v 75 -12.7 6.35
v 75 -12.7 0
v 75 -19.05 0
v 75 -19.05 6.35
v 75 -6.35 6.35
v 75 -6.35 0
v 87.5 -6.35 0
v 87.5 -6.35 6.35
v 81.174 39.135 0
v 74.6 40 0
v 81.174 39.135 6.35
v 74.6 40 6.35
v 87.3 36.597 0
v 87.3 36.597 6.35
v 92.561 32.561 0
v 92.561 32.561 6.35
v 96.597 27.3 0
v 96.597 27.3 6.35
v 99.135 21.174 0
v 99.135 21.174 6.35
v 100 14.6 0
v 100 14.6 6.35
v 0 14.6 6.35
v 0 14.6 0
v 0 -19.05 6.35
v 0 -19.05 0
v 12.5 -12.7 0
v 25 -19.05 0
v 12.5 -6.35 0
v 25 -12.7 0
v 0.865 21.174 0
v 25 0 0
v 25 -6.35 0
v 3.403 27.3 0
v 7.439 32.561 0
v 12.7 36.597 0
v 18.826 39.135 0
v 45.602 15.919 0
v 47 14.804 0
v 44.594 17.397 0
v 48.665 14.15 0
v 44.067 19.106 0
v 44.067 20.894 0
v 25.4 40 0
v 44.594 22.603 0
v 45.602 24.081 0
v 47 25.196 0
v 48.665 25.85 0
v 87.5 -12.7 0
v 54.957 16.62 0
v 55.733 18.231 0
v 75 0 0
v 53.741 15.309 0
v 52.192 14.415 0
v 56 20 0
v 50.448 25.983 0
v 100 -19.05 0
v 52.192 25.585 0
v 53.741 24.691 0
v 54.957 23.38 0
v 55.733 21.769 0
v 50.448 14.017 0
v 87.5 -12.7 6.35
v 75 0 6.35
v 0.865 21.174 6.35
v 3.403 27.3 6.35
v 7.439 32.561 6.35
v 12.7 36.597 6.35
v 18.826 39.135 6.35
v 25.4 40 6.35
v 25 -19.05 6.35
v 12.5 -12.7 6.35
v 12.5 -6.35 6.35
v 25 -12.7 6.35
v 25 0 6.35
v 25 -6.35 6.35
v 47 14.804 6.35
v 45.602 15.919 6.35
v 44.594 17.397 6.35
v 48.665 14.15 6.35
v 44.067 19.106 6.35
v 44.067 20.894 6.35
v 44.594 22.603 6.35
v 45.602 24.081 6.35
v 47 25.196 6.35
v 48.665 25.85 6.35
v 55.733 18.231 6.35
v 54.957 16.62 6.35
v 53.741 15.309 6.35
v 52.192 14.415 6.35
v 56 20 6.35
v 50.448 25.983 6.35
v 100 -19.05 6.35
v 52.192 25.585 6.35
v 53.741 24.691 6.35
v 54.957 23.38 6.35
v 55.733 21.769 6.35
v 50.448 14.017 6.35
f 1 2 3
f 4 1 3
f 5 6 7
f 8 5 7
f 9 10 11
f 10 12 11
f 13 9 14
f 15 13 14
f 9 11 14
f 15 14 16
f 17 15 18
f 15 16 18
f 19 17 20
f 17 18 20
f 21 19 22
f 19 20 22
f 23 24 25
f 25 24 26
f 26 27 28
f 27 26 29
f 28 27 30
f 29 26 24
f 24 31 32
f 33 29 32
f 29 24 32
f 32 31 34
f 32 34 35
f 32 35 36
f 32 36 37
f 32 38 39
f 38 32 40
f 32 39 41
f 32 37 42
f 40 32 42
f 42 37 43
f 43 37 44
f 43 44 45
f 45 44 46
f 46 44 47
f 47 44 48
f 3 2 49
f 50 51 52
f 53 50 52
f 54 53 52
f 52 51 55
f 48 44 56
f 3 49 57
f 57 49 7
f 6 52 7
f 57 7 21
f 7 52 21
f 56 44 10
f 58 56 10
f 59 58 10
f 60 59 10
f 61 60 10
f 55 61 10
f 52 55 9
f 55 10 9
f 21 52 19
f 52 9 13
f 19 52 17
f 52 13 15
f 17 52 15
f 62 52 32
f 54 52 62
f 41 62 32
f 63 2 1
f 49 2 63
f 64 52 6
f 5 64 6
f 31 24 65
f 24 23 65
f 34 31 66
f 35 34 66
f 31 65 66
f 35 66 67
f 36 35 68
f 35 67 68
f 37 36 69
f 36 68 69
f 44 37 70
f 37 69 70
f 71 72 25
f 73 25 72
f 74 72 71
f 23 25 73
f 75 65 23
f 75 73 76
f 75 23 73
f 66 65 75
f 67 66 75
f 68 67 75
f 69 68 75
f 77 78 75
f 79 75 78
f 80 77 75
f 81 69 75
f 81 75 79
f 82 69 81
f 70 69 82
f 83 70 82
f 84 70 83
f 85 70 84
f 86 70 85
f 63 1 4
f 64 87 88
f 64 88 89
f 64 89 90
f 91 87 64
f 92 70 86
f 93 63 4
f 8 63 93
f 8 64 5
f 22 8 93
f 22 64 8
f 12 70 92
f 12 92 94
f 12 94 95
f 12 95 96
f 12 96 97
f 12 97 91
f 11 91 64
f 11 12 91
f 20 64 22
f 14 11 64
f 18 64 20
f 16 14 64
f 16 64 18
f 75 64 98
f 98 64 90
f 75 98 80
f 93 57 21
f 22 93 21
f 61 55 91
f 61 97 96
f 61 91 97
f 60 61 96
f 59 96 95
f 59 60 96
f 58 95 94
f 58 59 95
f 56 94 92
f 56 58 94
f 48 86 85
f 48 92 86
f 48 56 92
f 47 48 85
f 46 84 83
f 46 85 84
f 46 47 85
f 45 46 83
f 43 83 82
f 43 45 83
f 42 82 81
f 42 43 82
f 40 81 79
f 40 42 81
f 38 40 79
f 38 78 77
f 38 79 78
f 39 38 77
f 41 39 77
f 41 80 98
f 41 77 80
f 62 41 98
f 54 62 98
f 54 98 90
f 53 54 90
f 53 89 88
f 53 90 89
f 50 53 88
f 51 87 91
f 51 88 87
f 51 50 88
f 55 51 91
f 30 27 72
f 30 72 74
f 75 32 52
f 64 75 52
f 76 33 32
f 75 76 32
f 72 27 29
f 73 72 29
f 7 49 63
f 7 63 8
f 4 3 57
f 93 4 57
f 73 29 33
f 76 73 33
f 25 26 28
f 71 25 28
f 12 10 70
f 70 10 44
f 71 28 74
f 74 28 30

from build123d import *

# Parameters (mm, degrees)
BOSS_EXTRUDE1_DEPTH     = 6.35
CUT_EXTRUDE1_DEPTH      = 108.890326167
CUT_EXTRUDE1_DEPTH_BACK = 108.890326167
SKETCH2_R               = 5.999999938
FILLET1_R               = 25.4
CUT_EXTRUDE2_DEPTH      = 108.890326167
CUT_EXTRUDE2_DEPTH_BACK = 108.890326167
SKETCH3_W               = 12.499999987
SKETCH3_H               = 6.35


with BuildPart() as part:
    # Sketch1 → Boss-Extrude1 (new body)
    with BuildSketch(Plane.XY):
        Polygon((24.999999974, 0), (74.999999924, 0), (74.999999923, -6.35), (74.999999923, -19.05), (99.999999898, -19.05), (99.999999898, -6.35), (99.999999898, 0), (99.999999898, 40.00000001), (0, 40.00000001), (0, 0), (0, -6.35), (0, -19.05), (24.999999974, -19.05), (24.999999974, -6.35), align=None)
    extrude(amount=BOSS_EXTRUDE1_DEPTH)

    # Sketch2 → Cut-Extrude1 (cut, two sides: drawn at the far end of the back side and taken through both)
    with BuildSketch(Plane.XY.offset(6.35).offset(-CUT_EXTRUDE1_DEPTH_BACK)):
        with Locations((49.999999949, 20.000000005)):
            Circle(SKETCH2_R)
    extrude(amount=CUT_EXTRUDE1_DEPTH + CUT_EXTRUDE1_DEPTH_BACK, mode=Mode.SUBTRACT)

    # Fillet1
    fillet1_edges = [part.edges().sort_by_distance(p)[0] for p in [
        (0, 40.00000001, 3.175),
        (99.999999898, 40.00000001, 3.175),
    ]]
    fillet(fillet1_edges, radius=FILLET1_R)

    # Sketch3 → Cut-Extrude2 (cut, two sides: drawn at the far end of the back side and taken through both)
    with BuildSketch(Plane.XY.offset(6.35).offset(-CUT_EXTRUDE2_DEPTH_BACK)):
        with Locations((81.249999918, -9.525)):
            Rectangle(SKETCH3_W, SKETCH3_H)
        with Locations((18.749999981, -9.525)):
            Rectangle(SKETCH3_W, SKETCH3_H)
    extrude(amount=CUT_EXTRUDE2_DEPTH + CUT_EXTRUDE2_DEPTH_BACK, mode=Mode.SUBTRACT)


solid = part.part
